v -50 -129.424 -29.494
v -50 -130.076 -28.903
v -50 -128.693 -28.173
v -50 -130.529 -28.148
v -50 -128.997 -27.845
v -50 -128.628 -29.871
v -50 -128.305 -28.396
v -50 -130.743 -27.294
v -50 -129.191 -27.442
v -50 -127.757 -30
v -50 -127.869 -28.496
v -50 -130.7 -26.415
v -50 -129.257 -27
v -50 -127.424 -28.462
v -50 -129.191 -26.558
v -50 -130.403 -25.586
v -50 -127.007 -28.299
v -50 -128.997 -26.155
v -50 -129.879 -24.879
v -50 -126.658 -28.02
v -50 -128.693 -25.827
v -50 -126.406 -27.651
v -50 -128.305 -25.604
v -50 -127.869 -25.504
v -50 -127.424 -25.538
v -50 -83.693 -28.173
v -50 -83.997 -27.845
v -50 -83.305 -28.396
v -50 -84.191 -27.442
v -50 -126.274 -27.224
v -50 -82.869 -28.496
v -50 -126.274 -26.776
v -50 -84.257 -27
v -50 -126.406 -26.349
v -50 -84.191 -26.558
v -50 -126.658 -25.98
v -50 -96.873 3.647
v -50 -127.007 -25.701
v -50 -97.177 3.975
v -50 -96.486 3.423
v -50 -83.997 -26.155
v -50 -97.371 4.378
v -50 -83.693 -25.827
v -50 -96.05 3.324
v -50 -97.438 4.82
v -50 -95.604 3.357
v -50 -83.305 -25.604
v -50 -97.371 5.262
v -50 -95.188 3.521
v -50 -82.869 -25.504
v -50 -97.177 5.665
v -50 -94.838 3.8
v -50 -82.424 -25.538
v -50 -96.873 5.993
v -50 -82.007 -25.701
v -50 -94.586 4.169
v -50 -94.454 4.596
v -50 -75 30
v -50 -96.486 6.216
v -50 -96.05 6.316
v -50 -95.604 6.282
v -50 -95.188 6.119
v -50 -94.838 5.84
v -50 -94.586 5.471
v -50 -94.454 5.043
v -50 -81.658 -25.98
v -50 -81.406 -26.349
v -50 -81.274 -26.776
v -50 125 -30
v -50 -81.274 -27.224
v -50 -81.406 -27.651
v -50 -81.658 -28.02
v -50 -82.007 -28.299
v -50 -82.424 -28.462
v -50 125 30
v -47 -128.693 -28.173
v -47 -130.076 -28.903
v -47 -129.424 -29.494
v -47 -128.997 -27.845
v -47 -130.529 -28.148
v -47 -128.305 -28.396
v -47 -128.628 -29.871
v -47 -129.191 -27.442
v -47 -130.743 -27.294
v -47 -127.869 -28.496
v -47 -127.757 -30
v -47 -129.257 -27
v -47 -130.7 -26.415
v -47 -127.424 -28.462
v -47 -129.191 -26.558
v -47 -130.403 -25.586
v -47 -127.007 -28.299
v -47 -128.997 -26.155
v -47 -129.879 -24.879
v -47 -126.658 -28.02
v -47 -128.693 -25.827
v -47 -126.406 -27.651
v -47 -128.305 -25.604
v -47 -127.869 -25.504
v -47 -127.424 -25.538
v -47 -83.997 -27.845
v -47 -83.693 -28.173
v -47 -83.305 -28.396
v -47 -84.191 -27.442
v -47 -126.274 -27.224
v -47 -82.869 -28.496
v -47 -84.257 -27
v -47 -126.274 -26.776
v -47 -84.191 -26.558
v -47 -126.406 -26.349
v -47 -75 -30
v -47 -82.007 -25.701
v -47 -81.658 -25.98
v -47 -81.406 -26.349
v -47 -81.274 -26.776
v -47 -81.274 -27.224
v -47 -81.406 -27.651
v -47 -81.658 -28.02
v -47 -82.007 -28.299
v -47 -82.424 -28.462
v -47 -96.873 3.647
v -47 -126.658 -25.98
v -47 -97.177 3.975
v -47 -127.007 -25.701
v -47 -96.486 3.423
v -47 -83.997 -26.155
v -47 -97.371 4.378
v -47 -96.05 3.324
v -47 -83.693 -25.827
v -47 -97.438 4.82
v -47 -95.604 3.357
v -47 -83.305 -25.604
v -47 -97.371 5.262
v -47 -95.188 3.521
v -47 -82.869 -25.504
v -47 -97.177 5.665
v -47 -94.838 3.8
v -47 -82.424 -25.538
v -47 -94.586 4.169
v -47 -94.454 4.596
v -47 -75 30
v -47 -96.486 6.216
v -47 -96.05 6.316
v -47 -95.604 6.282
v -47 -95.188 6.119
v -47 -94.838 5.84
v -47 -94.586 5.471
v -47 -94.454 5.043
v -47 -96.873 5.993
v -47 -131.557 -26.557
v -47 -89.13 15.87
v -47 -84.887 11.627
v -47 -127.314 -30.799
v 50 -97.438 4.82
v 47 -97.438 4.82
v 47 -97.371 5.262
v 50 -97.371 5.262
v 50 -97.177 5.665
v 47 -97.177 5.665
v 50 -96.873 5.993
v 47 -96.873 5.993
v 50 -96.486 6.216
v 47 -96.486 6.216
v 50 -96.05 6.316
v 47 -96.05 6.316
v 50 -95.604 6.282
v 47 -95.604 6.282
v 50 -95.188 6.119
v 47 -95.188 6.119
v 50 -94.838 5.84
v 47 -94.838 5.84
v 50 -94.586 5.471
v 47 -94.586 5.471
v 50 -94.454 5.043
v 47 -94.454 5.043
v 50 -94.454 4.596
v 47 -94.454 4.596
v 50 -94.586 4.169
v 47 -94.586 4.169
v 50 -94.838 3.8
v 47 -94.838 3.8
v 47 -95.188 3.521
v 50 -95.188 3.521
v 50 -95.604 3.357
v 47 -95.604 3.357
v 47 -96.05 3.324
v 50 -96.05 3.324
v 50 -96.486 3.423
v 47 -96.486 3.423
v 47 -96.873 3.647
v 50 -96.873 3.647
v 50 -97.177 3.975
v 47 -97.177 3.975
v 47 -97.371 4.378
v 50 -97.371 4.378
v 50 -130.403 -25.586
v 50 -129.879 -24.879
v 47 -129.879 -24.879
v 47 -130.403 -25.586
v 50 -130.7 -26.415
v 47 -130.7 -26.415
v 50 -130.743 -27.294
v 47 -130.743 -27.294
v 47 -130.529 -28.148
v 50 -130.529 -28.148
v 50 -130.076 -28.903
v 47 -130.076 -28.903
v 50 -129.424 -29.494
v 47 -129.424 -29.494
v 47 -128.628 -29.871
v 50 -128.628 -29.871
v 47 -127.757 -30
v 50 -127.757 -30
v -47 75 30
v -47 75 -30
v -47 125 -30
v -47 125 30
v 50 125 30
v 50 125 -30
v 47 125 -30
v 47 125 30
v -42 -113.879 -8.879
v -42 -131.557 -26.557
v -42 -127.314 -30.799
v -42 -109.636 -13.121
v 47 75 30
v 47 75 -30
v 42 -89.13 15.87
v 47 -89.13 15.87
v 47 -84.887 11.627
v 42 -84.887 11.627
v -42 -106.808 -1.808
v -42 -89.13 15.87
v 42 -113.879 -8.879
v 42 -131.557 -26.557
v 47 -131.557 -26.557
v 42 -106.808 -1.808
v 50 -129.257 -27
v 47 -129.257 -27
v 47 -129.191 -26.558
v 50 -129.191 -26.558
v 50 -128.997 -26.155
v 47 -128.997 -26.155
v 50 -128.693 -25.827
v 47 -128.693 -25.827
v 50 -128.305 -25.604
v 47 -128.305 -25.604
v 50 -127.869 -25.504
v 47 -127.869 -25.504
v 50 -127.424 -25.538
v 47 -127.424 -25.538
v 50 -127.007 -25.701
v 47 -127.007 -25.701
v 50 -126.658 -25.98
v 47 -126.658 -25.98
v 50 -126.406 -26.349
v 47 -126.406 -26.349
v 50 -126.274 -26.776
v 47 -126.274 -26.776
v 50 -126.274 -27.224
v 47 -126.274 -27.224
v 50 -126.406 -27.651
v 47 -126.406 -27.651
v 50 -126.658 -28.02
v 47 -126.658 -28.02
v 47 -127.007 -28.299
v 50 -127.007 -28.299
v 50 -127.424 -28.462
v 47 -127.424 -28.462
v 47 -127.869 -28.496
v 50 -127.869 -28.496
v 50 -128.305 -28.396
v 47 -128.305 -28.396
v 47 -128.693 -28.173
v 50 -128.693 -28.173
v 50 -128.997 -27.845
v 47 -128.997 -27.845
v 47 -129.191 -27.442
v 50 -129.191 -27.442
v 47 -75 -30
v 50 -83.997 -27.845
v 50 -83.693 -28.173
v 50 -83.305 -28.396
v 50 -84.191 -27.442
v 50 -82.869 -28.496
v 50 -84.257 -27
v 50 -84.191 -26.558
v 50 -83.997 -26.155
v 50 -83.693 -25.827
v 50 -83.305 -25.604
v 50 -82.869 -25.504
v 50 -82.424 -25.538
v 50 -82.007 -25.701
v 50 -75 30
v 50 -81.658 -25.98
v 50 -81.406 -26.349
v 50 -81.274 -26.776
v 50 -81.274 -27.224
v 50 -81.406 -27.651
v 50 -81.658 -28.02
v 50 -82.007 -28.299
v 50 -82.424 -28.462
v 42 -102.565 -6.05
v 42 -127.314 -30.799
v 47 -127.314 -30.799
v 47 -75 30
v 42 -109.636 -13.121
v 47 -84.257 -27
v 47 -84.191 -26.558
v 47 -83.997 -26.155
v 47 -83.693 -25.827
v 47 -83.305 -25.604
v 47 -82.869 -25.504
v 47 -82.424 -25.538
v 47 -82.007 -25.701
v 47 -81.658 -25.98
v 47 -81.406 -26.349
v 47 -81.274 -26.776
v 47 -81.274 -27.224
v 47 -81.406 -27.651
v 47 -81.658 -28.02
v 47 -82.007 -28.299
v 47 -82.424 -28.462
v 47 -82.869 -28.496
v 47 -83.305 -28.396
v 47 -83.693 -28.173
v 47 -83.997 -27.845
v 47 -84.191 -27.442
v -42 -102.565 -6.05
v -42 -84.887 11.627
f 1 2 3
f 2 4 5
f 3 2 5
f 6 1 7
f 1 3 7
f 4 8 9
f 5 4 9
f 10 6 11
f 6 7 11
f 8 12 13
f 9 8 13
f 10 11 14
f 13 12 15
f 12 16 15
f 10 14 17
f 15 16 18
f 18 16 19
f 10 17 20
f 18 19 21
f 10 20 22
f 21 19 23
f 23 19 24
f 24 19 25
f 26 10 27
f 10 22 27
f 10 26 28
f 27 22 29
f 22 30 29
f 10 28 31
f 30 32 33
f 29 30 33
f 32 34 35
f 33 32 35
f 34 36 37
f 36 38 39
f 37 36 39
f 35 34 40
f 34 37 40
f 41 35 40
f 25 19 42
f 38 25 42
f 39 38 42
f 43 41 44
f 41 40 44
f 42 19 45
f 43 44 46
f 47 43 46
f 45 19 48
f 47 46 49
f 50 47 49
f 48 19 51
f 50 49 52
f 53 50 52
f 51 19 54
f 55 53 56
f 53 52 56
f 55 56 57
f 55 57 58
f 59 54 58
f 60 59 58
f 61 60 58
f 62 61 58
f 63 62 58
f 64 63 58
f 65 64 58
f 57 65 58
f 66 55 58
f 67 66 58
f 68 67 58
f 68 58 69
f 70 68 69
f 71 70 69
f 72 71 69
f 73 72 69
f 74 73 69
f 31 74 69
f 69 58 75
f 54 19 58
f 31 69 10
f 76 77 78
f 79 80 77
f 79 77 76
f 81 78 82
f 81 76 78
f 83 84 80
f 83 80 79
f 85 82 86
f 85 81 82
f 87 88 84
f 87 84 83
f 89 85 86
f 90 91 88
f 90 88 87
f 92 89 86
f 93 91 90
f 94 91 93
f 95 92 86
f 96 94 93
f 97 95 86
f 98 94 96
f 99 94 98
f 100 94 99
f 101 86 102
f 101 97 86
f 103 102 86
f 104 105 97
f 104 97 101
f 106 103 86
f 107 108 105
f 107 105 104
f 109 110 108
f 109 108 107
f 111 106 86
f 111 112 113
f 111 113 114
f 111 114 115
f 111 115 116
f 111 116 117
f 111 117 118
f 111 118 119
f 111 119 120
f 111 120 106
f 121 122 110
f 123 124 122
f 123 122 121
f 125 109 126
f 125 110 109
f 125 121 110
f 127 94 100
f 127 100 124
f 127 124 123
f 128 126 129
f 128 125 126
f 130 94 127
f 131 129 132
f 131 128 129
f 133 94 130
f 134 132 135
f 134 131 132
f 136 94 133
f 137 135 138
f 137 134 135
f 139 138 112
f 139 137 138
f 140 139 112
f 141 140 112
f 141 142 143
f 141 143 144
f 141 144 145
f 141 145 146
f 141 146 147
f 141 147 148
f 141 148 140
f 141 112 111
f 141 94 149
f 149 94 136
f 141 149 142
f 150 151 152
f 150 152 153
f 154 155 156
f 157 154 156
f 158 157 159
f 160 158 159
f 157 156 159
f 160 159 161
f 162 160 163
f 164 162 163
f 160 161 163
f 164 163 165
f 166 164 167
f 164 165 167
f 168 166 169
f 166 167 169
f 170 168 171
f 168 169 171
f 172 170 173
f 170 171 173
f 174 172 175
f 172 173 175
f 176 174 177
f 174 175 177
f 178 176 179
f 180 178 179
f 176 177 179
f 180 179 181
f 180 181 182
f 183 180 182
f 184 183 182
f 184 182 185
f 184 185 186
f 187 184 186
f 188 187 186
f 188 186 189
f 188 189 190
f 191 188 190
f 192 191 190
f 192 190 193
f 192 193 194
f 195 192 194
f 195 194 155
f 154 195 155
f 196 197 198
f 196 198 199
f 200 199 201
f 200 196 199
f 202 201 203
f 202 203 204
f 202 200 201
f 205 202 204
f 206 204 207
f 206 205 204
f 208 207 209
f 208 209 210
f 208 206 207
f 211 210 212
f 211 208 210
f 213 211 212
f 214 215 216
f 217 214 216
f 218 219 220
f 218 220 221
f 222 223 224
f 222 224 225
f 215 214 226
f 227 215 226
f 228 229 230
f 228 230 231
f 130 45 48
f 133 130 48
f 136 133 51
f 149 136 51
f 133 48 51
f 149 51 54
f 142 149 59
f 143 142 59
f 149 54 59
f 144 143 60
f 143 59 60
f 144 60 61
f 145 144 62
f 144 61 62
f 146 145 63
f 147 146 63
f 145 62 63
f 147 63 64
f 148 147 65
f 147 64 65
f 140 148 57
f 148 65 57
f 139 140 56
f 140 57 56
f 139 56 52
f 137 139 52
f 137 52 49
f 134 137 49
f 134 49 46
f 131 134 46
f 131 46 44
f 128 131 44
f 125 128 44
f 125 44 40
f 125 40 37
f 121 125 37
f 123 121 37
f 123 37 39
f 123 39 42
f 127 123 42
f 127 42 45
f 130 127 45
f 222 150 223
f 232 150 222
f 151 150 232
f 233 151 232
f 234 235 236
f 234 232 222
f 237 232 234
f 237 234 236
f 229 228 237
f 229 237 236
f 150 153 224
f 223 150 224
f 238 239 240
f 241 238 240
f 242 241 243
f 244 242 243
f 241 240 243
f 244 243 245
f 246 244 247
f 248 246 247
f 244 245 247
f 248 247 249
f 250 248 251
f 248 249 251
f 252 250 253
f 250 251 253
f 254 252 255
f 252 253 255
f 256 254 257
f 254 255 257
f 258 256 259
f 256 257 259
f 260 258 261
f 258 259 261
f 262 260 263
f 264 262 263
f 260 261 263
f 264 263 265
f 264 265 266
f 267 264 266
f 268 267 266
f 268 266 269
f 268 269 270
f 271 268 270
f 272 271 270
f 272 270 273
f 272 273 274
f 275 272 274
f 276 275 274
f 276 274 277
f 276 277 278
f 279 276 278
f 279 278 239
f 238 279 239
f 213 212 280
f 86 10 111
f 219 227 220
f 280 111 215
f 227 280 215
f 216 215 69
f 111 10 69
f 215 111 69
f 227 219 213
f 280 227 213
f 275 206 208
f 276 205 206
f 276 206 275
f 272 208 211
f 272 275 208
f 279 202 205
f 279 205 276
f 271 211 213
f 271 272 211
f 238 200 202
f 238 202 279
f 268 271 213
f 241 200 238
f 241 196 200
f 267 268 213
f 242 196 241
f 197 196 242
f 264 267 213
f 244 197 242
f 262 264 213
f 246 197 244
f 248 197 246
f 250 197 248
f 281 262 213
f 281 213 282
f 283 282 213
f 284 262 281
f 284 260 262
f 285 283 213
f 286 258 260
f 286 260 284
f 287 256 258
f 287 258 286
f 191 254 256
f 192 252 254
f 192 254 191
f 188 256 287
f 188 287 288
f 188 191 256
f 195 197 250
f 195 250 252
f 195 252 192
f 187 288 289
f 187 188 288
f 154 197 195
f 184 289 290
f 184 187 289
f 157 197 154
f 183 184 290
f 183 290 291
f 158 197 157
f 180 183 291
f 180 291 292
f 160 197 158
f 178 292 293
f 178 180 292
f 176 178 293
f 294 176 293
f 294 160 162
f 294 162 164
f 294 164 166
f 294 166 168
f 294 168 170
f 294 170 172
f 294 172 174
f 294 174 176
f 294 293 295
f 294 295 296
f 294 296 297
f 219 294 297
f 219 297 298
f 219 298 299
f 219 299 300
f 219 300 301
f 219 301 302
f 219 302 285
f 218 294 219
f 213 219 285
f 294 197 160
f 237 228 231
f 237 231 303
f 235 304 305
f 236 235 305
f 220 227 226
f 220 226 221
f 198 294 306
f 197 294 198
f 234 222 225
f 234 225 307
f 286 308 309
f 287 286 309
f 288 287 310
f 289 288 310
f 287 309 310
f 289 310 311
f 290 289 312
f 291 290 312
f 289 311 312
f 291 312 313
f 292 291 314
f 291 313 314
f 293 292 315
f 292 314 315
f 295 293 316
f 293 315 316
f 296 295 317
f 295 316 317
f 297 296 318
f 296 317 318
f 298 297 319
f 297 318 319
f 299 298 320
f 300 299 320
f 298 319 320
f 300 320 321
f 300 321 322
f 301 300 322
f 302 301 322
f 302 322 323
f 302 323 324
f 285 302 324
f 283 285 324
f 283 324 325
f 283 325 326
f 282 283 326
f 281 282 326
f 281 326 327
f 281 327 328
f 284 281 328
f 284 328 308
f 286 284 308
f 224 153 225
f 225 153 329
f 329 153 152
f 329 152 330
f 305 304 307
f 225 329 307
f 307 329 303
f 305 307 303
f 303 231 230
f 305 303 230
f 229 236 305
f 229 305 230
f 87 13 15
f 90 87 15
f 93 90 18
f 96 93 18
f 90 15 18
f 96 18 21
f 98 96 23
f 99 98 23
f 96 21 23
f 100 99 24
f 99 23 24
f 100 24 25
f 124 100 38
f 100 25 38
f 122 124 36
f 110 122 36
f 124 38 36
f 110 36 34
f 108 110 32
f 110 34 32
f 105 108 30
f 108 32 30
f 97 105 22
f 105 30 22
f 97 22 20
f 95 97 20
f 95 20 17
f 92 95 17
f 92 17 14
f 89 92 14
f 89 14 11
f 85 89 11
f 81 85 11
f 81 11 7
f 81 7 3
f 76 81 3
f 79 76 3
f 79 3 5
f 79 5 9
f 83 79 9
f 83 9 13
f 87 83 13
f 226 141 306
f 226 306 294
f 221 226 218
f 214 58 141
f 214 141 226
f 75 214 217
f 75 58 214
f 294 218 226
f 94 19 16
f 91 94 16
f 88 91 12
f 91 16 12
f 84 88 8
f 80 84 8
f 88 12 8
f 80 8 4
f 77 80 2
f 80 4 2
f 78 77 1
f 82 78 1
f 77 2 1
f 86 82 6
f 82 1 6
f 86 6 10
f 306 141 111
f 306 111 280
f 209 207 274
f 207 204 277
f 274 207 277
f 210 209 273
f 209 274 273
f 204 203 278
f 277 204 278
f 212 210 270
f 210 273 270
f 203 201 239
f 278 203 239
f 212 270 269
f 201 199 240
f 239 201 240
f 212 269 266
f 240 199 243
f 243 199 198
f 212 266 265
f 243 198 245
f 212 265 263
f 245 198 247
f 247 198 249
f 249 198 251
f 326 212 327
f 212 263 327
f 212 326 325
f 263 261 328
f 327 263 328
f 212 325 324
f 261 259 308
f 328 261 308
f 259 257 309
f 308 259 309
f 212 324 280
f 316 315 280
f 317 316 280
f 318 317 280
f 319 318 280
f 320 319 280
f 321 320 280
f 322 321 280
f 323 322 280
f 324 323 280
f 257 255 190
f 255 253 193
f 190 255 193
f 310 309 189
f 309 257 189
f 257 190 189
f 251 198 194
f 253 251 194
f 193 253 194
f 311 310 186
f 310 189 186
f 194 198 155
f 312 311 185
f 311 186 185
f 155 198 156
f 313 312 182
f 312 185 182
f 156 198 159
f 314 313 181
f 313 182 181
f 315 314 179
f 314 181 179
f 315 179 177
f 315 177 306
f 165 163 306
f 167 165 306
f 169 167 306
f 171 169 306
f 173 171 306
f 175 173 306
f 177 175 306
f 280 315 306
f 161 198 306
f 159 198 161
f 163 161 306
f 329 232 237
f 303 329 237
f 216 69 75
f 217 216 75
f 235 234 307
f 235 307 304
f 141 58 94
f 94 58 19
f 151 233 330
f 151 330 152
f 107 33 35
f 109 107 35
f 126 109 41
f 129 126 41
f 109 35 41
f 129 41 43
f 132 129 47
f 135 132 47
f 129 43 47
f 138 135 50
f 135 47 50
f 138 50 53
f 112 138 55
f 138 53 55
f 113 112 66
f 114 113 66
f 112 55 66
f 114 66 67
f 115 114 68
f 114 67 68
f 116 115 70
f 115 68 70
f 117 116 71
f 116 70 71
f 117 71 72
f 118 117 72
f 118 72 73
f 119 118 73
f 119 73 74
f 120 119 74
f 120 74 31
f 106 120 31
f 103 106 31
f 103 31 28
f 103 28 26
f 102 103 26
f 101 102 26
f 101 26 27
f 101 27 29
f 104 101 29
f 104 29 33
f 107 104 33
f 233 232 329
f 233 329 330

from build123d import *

# Parameters (mm, degrees)
F0_W     = 100
F0_H     = 60
F1_DEPTH = 75
F3_DEPTH = 3
F5_D     = 3
F6_W     = 84
F6_H     = 9.9999939085
F7_DEPTH = 6
F8_W     = 50
F8_H     = 60
F9_DEPTH = 3


with BuildPart() as f1:
    # F0 (on Front) → F1 (new body, symmetric)
    with BuildSketch(Plane.XZ):
        Rectangle(F0_W, F0_H)
    extrude(amount=F1_DEPTH, both=True)

    # F2 (on face) → F3 (join)
    with BuildSketch(Plane.YZ.offset(50)):
        with BuildLine():
            Line((-75, -30), (-75, 30))
            Line((-75, 30), (-129.8786796564, -24.8786796564))
            ThreePointArc((-129.8786796564, -24.8786796564), (-130.5289979104, -28.1480502971), (-127.7573593129, -30))
            Line((-127.7573593129, -30), (-75, -30))
        make_face()
    extrude(amount=-F3_DEPTH)

    # F4: F1 across plane


with BuildPart() as f1_1:
    add(f1.part)
    add(f1.part.mirror(Plane.YZ))

    # F5 (through all)
    with Locations(Plane.YZ.offset(50)):
        with Locations((-95.9375541595, 4.8198051534), (-127.7573593129, -27), (-82.7573593129, -27)):
            Hole(F5_D / 2)



with BuildPart() as f7:
    # F6 (on face) → F7 (new body)
    with BuildSketch(Plane(origin=(0, -52.5, 52.5), x_dir=(1, 0, 0), z_dir=(0, -0.7071067812, 0.7071067812))):
        Polygon((-42, -51.8028065562), (-47, -51.8028065562), (-47, -111.8028065562), (-42, -111.8028065562), (-42, -86.8028065562), (-42, -76.8028126477), align=None)
        with Locations((0, -81.802809602)):
            Rectangle(F6_W, F6_H)
        Polygon((42, -51.8028065562), (42, -76.8028126477), (42, -86.8028065562), (42, -111.8028065562), (47, -111.8028065562), (47, -51.8028065562), align=None)
    extrude(amount=-F7_DEPTH)


with BuildPart() as f9:
    # F8 (on face) → F9 (new body)
    with BuildSketch(Plane.YZ.offset(50)):
        with Locations((100, 0)):
            Rectangle(F8_W, F8_H)
    extrude(amount=-F9_DEPTH)


with BuildPart() as f1_2:
    add(f1_1.part)

    add(f9.part)  # F10 merges F9
    # F10: F9 across plane
    add(f9.part.mirror(Plane.YZ))


solid = Compound([f7.part, f1_2.part])
